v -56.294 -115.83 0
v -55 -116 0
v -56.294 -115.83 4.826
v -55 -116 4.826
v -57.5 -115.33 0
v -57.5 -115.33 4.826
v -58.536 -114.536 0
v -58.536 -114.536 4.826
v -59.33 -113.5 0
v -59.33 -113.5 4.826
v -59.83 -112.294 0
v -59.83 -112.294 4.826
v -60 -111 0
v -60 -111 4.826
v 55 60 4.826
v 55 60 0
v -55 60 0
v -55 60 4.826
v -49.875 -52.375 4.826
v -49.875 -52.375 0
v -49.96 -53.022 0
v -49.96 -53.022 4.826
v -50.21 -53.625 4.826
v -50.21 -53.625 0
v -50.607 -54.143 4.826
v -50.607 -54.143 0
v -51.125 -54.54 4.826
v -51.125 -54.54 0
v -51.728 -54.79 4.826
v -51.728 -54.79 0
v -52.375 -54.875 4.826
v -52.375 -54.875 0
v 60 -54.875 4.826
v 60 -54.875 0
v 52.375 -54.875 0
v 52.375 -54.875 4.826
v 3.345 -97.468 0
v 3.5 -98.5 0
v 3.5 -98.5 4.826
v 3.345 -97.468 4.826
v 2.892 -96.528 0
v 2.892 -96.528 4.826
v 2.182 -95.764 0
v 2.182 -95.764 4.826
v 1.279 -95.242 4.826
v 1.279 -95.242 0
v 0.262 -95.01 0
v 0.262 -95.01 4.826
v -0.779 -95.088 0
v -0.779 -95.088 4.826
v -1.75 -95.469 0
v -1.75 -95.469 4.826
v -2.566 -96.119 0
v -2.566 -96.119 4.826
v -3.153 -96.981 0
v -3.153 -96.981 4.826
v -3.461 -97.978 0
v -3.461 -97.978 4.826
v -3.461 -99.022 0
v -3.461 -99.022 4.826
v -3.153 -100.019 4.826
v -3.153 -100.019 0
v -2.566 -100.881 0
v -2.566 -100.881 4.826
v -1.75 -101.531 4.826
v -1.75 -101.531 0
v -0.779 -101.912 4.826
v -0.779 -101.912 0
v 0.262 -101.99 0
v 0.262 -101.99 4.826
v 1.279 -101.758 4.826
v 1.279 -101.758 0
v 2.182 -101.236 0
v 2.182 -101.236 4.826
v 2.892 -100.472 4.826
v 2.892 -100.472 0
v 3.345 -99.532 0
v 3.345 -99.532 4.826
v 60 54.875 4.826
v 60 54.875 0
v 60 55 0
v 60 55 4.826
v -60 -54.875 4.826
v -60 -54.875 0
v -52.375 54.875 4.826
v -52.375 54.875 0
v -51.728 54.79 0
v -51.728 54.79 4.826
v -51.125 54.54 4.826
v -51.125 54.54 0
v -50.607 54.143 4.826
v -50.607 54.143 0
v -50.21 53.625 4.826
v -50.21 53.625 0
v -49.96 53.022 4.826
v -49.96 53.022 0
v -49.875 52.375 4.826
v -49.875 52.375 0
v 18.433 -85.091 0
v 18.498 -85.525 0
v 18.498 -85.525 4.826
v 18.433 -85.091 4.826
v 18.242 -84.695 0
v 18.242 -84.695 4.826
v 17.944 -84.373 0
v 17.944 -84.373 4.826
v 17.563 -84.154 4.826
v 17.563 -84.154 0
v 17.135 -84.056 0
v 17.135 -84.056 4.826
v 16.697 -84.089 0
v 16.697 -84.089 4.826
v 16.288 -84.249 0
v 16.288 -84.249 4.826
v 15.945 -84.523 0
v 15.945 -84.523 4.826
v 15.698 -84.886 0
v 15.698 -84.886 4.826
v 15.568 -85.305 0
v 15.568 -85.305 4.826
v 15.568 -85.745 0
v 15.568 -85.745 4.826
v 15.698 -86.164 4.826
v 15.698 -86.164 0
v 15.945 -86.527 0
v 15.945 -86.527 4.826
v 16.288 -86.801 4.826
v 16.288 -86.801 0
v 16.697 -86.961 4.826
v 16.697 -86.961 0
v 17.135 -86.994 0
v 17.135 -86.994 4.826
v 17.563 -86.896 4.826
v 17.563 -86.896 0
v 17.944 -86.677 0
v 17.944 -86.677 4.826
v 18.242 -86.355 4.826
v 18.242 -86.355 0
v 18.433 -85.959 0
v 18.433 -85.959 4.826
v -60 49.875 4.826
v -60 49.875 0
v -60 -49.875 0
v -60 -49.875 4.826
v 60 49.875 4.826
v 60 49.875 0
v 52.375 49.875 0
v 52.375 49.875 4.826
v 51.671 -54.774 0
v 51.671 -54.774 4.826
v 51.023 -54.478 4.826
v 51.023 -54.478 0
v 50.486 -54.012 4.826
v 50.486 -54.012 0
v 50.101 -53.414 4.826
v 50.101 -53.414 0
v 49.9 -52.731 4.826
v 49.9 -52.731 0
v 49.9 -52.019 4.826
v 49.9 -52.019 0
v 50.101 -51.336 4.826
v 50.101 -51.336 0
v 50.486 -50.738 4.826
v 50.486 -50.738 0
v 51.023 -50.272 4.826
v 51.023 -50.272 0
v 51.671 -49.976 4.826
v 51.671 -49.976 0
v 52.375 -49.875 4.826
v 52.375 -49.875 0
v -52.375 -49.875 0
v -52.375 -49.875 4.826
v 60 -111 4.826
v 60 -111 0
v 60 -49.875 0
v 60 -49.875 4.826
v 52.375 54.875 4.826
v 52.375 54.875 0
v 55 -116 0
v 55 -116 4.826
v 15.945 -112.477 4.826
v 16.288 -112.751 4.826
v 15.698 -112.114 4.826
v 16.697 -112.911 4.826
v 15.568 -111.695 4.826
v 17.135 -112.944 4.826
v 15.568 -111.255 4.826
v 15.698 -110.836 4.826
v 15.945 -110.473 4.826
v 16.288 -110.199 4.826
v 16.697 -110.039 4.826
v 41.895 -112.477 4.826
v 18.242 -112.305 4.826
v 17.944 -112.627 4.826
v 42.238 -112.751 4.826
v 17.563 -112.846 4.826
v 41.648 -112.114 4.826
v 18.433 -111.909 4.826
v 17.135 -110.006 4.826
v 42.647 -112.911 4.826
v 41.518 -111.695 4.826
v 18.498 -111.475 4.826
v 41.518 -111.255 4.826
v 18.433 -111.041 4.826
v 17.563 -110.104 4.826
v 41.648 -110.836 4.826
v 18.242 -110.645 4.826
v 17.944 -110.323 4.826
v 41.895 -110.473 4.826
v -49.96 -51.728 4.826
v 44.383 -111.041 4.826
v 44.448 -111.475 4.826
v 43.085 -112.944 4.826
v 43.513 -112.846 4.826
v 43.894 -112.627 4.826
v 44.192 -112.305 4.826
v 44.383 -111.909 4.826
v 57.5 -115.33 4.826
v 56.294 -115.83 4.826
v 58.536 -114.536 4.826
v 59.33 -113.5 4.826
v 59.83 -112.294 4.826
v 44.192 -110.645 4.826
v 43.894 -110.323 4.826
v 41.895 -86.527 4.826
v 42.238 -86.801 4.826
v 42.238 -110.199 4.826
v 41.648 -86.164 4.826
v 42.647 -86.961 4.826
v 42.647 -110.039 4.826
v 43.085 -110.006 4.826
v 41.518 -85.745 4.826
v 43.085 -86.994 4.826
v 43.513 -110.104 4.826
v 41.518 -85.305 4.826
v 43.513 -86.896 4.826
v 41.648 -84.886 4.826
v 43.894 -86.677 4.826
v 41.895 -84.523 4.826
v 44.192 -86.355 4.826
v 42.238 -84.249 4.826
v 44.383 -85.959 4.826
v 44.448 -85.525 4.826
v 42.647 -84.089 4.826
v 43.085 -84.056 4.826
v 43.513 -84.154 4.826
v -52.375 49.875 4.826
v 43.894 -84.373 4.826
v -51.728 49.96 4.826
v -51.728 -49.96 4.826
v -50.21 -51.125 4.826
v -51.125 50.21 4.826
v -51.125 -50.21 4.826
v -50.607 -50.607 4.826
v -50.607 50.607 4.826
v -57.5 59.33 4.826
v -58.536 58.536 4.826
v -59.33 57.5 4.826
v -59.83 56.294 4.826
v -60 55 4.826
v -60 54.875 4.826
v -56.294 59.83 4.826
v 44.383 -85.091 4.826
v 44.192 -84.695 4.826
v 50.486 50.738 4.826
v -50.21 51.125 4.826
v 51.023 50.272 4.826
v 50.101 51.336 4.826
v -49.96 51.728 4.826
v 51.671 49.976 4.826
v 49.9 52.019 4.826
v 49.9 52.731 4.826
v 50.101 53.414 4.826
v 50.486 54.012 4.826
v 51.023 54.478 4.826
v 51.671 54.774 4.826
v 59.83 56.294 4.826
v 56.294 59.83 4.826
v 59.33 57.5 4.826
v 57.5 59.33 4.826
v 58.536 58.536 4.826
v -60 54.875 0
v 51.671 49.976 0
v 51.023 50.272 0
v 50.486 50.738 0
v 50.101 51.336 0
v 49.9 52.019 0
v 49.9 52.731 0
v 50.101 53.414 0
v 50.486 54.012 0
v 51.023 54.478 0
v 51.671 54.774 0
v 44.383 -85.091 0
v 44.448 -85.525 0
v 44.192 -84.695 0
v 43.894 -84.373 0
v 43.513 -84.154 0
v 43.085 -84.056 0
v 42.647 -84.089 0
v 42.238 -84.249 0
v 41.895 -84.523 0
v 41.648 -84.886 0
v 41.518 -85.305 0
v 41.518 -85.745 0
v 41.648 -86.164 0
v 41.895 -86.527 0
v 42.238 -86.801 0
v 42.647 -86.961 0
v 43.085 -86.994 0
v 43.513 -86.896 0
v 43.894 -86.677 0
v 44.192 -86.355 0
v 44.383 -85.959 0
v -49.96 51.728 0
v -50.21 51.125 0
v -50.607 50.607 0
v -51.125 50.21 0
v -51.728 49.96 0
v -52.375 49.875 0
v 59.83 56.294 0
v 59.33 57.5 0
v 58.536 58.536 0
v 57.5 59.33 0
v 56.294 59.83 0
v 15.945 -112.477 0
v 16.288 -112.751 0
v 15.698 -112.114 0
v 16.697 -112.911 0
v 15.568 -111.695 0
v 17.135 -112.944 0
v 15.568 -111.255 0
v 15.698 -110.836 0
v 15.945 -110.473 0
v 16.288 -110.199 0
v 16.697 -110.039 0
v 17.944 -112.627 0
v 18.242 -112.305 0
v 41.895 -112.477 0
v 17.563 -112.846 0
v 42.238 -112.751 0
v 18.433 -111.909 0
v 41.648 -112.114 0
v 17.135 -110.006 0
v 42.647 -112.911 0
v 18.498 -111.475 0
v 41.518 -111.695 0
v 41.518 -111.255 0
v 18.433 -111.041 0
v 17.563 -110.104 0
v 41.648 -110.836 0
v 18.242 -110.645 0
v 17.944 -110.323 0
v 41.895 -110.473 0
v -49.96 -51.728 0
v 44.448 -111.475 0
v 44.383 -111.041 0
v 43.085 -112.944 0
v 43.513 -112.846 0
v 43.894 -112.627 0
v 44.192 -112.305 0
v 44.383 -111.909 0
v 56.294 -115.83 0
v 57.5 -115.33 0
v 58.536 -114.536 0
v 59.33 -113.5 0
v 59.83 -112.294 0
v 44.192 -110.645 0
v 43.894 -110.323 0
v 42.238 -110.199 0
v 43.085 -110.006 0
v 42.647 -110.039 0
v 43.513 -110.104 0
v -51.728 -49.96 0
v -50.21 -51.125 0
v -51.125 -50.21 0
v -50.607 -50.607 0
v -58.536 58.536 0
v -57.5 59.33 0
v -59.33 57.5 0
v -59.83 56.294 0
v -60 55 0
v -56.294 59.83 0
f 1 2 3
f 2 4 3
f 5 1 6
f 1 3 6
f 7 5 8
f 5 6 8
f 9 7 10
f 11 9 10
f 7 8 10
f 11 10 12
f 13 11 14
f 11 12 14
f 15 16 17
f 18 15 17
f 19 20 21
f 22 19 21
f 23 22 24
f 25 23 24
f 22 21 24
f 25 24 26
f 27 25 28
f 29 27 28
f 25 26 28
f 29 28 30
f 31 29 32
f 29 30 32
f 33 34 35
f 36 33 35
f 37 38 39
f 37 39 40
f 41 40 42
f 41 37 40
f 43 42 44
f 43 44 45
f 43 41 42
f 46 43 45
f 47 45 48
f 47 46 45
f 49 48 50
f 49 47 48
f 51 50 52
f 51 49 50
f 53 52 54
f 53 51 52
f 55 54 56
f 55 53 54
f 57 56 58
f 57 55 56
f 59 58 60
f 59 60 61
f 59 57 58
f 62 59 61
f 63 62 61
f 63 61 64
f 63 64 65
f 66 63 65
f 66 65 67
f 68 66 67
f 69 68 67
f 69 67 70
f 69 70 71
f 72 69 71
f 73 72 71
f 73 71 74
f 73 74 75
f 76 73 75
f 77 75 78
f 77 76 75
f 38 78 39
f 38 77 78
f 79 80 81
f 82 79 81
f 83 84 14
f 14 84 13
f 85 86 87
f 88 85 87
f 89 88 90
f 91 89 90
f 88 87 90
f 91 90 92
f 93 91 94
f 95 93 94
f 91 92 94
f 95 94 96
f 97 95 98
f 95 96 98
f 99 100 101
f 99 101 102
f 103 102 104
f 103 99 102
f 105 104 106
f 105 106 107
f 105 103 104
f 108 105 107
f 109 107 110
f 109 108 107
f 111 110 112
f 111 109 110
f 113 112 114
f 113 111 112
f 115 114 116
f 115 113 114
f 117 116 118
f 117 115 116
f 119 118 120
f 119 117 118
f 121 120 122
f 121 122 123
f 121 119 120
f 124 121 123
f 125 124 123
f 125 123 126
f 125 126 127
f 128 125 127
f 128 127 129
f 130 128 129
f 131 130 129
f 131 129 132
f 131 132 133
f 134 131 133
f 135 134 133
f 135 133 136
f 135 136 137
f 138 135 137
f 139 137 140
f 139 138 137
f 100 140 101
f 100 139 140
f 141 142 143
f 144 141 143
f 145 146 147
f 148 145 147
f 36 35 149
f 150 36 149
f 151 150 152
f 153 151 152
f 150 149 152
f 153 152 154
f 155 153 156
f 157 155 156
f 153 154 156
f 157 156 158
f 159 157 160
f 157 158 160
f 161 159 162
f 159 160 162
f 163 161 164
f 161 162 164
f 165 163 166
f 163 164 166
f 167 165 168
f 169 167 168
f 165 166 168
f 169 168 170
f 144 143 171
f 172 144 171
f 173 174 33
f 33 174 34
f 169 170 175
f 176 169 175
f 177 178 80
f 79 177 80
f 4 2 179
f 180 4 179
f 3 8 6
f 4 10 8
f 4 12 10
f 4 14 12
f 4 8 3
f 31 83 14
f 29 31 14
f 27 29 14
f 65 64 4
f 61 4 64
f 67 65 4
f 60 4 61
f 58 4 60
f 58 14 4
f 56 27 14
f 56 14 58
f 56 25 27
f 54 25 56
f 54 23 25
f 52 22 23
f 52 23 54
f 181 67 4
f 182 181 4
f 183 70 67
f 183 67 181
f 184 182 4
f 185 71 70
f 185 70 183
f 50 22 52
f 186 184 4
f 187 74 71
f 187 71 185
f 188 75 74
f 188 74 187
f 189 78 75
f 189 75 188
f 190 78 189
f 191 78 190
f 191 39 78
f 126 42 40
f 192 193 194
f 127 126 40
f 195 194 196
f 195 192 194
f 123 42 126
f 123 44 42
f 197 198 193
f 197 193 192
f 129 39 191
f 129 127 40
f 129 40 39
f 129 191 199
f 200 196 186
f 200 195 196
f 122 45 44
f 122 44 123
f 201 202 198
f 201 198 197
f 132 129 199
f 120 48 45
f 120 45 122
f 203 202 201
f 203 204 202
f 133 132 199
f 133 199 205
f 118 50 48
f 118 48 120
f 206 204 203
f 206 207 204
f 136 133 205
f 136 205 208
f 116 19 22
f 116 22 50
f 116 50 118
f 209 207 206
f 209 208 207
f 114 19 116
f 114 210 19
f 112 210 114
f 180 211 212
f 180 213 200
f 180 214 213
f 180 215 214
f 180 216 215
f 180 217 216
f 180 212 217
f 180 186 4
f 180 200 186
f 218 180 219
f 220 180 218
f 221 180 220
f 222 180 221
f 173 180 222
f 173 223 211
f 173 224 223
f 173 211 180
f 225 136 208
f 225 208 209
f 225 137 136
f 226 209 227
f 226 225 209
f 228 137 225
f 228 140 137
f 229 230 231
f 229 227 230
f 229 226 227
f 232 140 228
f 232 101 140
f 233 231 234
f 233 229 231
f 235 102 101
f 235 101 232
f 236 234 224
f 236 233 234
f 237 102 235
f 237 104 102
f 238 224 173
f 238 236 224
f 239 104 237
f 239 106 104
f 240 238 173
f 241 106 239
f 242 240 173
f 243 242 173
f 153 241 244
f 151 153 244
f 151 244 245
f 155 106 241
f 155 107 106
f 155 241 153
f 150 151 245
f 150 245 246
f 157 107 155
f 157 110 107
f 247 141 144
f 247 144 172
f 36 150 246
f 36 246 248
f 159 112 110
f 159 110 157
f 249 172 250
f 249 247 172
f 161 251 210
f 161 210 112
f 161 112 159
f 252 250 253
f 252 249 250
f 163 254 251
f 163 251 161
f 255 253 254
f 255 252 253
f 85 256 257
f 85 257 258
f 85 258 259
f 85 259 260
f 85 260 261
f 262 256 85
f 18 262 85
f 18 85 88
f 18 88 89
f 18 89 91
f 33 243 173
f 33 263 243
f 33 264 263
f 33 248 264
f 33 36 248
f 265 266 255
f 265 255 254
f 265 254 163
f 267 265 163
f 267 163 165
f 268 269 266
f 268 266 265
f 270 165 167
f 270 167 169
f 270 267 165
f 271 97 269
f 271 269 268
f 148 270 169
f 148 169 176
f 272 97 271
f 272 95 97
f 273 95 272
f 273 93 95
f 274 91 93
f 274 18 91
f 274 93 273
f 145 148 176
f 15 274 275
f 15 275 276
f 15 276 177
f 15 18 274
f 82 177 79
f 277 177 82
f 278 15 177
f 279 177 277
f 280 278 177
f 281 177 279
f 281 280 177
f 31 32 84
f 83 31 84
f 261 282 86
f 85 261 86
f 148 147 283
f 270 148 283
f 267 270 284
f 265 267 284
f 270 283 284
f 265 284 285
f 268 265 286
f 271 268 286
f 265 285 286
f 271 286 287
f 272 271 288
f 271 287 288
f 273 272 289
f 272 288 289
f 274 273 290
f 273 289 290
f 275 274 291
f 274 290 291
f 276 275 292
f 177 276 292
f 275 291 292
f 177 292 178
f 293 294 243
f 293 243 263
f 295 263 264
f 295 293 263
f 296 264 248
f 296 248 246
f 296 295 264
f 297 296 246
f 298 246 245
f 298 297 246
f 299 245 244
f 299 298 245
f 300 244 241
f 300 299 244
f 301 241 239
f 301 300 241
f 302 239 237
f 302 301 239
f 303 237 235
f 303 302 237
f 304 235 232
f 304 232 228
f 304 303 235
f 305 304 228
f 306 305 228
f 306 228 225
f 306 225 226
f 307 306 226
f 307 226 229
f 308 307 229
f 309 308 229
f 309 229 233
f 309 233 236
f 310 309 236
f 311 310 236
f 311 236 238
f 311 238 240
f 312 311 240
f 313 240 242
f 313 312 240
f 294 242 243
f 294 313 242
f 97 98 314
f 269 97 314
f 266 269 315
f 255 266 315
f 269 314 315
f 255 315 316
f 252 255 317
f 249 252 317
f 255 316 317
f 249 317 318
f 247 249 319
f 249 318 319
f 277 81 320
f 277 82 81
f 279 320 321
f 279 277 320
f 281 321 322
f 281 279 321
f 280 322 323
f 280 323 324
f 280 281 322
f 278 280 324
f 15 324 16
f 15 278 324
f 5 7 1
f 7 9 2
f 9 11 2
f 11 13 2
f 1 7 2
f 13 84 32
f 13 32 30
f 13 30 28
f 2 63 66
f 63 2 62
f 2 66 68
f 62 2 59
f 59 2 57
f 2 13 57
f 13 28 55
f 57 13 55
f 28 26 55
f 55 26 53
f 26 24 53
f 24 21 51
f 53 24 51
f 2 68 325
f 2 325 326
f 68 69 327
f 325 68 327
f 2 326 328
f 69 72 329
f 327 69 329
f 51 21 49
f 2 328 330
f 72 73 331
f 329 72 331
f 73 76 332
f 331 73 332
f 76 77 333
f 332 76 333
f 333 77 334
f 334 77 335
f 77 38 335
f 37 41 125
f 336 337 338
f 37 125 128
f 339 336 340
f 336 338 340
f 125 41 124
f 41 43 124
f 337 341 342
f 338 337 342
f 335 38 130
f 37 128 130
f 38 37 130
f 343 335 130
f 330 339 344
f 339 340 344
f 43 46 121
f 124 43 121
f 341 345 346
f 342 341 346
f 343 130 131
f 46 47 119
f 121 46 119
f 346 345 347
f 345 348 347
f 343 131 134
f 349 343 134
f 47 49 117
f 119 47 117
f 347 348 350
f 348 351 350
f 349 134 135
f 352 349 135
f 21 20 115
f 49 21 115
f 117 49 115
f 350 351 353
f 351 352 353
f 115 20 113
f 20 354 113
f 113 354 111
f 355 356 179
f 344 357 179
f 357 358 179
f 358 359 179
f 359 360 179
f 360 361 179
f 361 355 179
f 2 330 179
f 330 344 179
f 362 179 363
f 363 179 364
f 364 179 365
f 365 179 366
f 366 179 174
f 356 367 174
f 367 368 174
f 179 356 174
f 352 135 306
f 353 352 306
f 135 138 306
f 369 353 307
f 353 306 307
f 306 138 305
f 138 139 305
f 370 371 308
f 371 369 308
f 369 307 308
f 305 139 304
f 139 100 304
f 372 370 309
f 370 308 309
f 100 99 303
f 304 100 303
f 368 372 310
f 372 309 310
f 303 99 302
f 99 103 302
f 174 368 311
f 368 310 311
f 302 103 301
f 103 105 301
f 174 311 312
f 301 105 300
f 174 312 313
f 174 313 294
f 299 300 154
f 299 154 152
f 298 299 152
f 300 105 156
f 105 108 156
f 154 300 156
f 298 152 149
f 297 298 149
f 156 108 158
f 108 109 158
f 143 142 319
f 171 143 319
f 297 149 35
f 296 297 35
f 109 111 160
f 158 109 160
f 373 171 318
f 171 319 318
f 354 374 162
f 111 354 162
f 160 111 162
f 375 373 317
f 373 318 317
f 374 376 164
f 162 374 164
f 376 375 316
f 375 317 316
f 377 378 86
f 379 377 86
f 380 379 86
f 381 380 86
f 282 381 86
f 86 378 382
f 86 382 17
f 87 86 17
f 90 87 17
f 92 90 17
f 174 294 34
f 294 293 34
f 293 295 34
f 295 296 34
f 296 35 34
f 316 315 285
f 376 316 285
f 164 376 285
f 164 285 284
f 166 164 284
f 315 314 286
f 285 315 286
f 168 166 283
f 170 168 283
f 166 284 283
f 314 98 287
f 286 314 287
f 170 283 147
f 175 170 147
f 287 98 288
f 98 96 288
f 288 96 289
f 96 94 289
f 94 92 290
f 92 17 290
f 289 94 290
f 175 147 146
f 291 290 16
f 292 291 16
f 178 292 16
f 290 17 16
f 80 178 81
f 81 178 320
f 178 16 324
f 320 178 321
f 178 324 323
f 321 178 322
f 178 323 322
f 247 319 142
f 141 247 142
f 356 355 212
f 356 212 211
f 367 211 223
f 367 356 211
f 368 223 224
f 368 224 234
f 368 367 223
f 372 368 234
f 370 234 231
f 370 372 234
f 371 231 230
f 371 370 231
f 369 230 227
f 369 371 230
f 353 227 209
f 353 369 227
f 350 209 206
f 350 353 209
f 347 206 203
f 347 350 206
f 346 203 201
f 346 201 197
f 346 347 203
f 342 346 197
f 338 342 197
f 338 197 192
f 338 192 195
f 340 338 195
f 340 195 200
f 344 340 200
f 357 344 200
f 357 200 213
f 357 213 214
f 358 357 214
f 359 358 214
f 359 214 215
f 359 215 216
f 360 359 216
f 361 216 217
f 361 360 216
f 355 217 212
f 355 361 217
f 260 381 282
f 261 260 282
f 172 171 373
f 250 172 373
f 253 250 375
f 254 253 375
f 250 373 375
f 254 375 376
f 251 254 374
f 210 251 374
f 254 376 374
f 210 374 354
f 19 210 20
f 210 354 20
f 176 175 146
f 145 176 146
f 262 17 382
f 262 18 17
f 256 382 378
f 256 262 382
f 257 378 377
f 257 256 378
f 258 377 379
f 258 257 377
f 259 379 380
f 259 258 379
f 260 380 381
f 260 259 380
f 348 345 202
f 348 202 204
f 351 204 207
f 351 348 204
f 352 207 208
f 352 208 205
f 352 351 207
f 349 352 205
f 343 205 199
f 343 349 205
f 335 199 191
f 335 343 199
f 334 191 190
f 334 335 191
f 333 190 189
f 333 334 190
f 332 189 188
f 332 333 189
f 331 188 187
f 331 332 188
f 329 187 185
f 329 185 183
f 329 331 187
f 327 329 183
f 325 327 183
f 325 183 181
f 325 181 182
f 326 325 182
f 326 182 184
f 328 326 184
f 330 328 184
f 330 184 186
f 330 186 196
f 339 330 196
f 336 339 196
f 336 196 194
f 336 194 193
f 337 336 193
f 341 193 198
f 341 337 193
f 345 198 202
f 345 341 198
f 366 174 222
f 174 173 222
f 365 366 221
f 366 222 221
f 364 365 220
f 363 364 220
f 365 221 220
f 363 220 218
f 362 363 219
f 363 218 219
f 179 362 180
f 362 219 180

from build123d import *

# Parameters (mm, degrees)
F1_R     = 3.5
F1_R_2   = 1.4732
F2_DEPTH = 4.826
F3_R     = 5


with BuildPart() as f2:
    # F1 (on face) → F2 (new body)
    with BuildSketch(Plane.XY):
        with BuildLine():
            Line((60, 54.875), (60, 60))
            Line((60, 60), (-60, 60))
            Line((-60, 60), (-60, 54.875))
            Line((-60, 54.875), (-52.375, 54.875))
            ThreePointArc((-52.375, 54.875), (-50.607233, 54.142767), (-49.875, 52.375))
            ThreePointArc((-49.875, 52.375), (-50.607233, 50.607233), (-52.375, 49.875))
            Line((-52.375, 49.875), (-60, 49.875))
            Line((-60, 49.875), (-60, -49.875))
            Line((-60, -49.875), (-52.375, -49.875))
            ThreePointArc((-52.375, -49.875), (-50.607233, -50.607233), (-49.875, -52.375))
            ThreePointArc((-49.875, -52.375), (-50.607233, -54.142767), (-52.375, -54.875))
            Line((-52.375, -54.875), (-60, -54.875))
            Line((-60, -54.875), (-60, -60))
            Line((-60, -60), (-60, -116))
            Line((-60, -116), (60, -116))
            Line((60, -116), (60, -60))
            Line((60, -60), (60, -54.875))
            Line((60, -54.875), (52.375, -54.875))
            ThreePointArc((52.375, -54.875), (49.875, -52.375), (52.375, -49.875))
            Line((52.375, -49.875), (60, -49.875))
            Line((60, -49.875), (60, 49.875))
            Line((60, 49.875), (52.375, 49.875))
            ThreePointArc((52.375, 49.875), (49.875, 52.375), (52.375, 54.875))
            Line((52.375, 54.875), (60, 54.875))
        make_face()
        with Locations((0, -98.5)):
            Circle(F1_R, mode=Mode.SUBTRACT)
        with Locations((17.025, -111.475)):
            Circle(F1_R_2, mode=Mode.SUBTRACT)
        with Locations((17.025, -85.525)):
            Circle(F1_R_2, mode=Mode.SUBTRACT)
        with Locations((42.975, -111.475)):
            Circle(F1_R_2, mode=Mode.SUBTRACT)
        with Locations((42.975, -85.525)):
            Circle(F1_R_2, mode=Mode.SUBTRACT)
    extrude(amount=F2_DEPTH)

    # F3
    f3_edges = [f2.edges().sort_by_distance(p)[0] for p in [
        (-60, 60, 2.413),
        (60, 60, 2.413),
        (60, -116, 2.413),
        (-60, -116, 2.413),
    ]]
    fillet(f3_edges, radius=F3_R)


solid = f2.part
